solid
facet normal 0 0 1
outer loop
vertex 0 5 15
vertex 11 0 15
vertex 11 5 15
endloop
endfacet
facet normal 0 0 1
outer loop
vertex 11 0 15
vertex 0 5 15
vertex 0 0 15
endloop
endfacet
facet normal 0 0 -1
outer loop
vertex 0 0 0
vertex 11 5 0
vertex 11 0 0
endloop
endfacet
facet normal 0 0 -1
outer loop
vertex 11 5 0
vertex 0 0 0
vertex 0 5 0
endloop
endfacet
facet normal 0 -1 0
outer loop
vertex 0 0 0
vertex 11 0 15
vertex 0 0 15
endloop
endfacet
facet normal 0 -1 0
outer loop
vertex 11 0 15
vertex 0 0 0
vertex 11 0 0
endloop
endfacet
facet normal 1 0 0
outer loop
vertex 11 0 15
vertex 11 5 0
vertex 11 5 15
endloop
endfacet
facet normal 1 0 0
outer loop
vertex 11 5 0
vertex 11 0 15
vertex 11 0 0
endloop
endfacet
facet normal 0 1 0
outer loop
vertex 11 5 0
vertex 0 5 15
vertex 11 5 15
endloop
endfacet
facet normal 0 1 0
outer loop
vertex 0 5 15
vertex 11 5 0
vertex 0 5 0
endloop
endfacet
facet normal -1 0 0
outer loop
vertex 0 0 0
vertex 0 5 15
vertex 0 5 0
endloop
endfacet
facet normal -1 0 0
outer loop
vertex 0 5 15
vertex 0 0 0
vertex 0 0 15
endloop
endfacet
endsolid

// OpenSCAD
// Generated by SolidPython 1.0.1 on 2020-07-29 00:46:55


cube(size = [11, 5, 15]);
/***********************************************
*********      SolidPython code:      **********
************************************************
 
# import packages: SolidPython
from solid import *
from solid.utils import *
from itertools import chain, combinations, permutations


class Resize:

    def __init__(self, scad_file):
        self.scad_file = scad_file
        #self.scad_file = import_scad(scad_file)
        # cone/cylinder param:
        self.r1 = 0
        self.r2 = 0
        self.h = 0
        # rectangular prism param:
        self.w = 0
        self.l = 0
        # ellipse param:
        self.r = 0

    # import OpenScad code (file name corresponds to shape)


    # classify shape + parameters
    def assign(self, param1, param2, param3):
        if self.scad_file == 'cone.scad':
            self.r1 = param1
            self.r2 = param2
            self.h = param3
        elif self.scad_file == 'cylinder.scad':
            self.r1 = param1
            self.r2 = param2
            self.h = param3
        elif self.scad_file == 'rectangularPrism.scad':
            self.h = param1
            self.l = param2
            self.w = param3
        else:
            self.r = param1
            self.h = param2

    # resize parameters
    def iterate(self):
        x = range(3, 20, 2)
        i = 1
        if self.scad_file == 'cone.scad':
            tempList = list(permutations(x, 2))
            for temp in tempList:
                param1 = temp[0]
                param2 = temp[1]
                filepath = 'produced_scad_files/' + 'cone' + str(param1) + '_' + str(param2) + '_' + '.scad'
                scad_render_to_file(cylinder(h=param1, r1=param2, r2=0), filepath)

        elif self.scad_file == 'cylinder.scad':
            tempList = list(permutations(x, 3))
            for temp in tempList:
                param1 = temp[0]
                param2 = temp[1]
                filepath = 'produced_scad_files/' + 'cylinder' + str(param1) + '_' + str(param2) + '_' + '.scad'
                scad_render_to_file(cylinder(h=param1, r1=param2, r2=param2), filepath)

        elif self.scad_file == 'rectangularPrism.scad':
            tempList = list(permutations(x, 3))
            for temp in tempList:
                param1 = temp[0]
                param2 = temp[1]
                param3 = temp[2]
                filepath = 'produced_scad_files/' + 'rectangularPrism' + str(param1) + '_' + str(param2) + '_' + str(
                    param3) + '.scad'
                scad_render_to_file(cube(size=(param1, param2, param3)), filepath)

        elif self.scad_file == 'ellipse.scad':
            tempList = list(permutations(x, 4))
            for temp in tempList:
                param1 = temp[0]
                param2 = temp[1]
                param3 = temp[2]
                param4 = temp[3]
                filepath = 'produced_scad_files/' + 'ellipse' + str(param1) + '_' + str(param2) + '_' + str(param3) + '_' + str(param4) + '.scad'
                scad_render_to_file(scale([param1, param2, param3])(sphere(r=param4)), filepath)

    def render_to_scadfile(self):
        scad_render_to_file(scad, 'example.scad') 
 
************************************************/
